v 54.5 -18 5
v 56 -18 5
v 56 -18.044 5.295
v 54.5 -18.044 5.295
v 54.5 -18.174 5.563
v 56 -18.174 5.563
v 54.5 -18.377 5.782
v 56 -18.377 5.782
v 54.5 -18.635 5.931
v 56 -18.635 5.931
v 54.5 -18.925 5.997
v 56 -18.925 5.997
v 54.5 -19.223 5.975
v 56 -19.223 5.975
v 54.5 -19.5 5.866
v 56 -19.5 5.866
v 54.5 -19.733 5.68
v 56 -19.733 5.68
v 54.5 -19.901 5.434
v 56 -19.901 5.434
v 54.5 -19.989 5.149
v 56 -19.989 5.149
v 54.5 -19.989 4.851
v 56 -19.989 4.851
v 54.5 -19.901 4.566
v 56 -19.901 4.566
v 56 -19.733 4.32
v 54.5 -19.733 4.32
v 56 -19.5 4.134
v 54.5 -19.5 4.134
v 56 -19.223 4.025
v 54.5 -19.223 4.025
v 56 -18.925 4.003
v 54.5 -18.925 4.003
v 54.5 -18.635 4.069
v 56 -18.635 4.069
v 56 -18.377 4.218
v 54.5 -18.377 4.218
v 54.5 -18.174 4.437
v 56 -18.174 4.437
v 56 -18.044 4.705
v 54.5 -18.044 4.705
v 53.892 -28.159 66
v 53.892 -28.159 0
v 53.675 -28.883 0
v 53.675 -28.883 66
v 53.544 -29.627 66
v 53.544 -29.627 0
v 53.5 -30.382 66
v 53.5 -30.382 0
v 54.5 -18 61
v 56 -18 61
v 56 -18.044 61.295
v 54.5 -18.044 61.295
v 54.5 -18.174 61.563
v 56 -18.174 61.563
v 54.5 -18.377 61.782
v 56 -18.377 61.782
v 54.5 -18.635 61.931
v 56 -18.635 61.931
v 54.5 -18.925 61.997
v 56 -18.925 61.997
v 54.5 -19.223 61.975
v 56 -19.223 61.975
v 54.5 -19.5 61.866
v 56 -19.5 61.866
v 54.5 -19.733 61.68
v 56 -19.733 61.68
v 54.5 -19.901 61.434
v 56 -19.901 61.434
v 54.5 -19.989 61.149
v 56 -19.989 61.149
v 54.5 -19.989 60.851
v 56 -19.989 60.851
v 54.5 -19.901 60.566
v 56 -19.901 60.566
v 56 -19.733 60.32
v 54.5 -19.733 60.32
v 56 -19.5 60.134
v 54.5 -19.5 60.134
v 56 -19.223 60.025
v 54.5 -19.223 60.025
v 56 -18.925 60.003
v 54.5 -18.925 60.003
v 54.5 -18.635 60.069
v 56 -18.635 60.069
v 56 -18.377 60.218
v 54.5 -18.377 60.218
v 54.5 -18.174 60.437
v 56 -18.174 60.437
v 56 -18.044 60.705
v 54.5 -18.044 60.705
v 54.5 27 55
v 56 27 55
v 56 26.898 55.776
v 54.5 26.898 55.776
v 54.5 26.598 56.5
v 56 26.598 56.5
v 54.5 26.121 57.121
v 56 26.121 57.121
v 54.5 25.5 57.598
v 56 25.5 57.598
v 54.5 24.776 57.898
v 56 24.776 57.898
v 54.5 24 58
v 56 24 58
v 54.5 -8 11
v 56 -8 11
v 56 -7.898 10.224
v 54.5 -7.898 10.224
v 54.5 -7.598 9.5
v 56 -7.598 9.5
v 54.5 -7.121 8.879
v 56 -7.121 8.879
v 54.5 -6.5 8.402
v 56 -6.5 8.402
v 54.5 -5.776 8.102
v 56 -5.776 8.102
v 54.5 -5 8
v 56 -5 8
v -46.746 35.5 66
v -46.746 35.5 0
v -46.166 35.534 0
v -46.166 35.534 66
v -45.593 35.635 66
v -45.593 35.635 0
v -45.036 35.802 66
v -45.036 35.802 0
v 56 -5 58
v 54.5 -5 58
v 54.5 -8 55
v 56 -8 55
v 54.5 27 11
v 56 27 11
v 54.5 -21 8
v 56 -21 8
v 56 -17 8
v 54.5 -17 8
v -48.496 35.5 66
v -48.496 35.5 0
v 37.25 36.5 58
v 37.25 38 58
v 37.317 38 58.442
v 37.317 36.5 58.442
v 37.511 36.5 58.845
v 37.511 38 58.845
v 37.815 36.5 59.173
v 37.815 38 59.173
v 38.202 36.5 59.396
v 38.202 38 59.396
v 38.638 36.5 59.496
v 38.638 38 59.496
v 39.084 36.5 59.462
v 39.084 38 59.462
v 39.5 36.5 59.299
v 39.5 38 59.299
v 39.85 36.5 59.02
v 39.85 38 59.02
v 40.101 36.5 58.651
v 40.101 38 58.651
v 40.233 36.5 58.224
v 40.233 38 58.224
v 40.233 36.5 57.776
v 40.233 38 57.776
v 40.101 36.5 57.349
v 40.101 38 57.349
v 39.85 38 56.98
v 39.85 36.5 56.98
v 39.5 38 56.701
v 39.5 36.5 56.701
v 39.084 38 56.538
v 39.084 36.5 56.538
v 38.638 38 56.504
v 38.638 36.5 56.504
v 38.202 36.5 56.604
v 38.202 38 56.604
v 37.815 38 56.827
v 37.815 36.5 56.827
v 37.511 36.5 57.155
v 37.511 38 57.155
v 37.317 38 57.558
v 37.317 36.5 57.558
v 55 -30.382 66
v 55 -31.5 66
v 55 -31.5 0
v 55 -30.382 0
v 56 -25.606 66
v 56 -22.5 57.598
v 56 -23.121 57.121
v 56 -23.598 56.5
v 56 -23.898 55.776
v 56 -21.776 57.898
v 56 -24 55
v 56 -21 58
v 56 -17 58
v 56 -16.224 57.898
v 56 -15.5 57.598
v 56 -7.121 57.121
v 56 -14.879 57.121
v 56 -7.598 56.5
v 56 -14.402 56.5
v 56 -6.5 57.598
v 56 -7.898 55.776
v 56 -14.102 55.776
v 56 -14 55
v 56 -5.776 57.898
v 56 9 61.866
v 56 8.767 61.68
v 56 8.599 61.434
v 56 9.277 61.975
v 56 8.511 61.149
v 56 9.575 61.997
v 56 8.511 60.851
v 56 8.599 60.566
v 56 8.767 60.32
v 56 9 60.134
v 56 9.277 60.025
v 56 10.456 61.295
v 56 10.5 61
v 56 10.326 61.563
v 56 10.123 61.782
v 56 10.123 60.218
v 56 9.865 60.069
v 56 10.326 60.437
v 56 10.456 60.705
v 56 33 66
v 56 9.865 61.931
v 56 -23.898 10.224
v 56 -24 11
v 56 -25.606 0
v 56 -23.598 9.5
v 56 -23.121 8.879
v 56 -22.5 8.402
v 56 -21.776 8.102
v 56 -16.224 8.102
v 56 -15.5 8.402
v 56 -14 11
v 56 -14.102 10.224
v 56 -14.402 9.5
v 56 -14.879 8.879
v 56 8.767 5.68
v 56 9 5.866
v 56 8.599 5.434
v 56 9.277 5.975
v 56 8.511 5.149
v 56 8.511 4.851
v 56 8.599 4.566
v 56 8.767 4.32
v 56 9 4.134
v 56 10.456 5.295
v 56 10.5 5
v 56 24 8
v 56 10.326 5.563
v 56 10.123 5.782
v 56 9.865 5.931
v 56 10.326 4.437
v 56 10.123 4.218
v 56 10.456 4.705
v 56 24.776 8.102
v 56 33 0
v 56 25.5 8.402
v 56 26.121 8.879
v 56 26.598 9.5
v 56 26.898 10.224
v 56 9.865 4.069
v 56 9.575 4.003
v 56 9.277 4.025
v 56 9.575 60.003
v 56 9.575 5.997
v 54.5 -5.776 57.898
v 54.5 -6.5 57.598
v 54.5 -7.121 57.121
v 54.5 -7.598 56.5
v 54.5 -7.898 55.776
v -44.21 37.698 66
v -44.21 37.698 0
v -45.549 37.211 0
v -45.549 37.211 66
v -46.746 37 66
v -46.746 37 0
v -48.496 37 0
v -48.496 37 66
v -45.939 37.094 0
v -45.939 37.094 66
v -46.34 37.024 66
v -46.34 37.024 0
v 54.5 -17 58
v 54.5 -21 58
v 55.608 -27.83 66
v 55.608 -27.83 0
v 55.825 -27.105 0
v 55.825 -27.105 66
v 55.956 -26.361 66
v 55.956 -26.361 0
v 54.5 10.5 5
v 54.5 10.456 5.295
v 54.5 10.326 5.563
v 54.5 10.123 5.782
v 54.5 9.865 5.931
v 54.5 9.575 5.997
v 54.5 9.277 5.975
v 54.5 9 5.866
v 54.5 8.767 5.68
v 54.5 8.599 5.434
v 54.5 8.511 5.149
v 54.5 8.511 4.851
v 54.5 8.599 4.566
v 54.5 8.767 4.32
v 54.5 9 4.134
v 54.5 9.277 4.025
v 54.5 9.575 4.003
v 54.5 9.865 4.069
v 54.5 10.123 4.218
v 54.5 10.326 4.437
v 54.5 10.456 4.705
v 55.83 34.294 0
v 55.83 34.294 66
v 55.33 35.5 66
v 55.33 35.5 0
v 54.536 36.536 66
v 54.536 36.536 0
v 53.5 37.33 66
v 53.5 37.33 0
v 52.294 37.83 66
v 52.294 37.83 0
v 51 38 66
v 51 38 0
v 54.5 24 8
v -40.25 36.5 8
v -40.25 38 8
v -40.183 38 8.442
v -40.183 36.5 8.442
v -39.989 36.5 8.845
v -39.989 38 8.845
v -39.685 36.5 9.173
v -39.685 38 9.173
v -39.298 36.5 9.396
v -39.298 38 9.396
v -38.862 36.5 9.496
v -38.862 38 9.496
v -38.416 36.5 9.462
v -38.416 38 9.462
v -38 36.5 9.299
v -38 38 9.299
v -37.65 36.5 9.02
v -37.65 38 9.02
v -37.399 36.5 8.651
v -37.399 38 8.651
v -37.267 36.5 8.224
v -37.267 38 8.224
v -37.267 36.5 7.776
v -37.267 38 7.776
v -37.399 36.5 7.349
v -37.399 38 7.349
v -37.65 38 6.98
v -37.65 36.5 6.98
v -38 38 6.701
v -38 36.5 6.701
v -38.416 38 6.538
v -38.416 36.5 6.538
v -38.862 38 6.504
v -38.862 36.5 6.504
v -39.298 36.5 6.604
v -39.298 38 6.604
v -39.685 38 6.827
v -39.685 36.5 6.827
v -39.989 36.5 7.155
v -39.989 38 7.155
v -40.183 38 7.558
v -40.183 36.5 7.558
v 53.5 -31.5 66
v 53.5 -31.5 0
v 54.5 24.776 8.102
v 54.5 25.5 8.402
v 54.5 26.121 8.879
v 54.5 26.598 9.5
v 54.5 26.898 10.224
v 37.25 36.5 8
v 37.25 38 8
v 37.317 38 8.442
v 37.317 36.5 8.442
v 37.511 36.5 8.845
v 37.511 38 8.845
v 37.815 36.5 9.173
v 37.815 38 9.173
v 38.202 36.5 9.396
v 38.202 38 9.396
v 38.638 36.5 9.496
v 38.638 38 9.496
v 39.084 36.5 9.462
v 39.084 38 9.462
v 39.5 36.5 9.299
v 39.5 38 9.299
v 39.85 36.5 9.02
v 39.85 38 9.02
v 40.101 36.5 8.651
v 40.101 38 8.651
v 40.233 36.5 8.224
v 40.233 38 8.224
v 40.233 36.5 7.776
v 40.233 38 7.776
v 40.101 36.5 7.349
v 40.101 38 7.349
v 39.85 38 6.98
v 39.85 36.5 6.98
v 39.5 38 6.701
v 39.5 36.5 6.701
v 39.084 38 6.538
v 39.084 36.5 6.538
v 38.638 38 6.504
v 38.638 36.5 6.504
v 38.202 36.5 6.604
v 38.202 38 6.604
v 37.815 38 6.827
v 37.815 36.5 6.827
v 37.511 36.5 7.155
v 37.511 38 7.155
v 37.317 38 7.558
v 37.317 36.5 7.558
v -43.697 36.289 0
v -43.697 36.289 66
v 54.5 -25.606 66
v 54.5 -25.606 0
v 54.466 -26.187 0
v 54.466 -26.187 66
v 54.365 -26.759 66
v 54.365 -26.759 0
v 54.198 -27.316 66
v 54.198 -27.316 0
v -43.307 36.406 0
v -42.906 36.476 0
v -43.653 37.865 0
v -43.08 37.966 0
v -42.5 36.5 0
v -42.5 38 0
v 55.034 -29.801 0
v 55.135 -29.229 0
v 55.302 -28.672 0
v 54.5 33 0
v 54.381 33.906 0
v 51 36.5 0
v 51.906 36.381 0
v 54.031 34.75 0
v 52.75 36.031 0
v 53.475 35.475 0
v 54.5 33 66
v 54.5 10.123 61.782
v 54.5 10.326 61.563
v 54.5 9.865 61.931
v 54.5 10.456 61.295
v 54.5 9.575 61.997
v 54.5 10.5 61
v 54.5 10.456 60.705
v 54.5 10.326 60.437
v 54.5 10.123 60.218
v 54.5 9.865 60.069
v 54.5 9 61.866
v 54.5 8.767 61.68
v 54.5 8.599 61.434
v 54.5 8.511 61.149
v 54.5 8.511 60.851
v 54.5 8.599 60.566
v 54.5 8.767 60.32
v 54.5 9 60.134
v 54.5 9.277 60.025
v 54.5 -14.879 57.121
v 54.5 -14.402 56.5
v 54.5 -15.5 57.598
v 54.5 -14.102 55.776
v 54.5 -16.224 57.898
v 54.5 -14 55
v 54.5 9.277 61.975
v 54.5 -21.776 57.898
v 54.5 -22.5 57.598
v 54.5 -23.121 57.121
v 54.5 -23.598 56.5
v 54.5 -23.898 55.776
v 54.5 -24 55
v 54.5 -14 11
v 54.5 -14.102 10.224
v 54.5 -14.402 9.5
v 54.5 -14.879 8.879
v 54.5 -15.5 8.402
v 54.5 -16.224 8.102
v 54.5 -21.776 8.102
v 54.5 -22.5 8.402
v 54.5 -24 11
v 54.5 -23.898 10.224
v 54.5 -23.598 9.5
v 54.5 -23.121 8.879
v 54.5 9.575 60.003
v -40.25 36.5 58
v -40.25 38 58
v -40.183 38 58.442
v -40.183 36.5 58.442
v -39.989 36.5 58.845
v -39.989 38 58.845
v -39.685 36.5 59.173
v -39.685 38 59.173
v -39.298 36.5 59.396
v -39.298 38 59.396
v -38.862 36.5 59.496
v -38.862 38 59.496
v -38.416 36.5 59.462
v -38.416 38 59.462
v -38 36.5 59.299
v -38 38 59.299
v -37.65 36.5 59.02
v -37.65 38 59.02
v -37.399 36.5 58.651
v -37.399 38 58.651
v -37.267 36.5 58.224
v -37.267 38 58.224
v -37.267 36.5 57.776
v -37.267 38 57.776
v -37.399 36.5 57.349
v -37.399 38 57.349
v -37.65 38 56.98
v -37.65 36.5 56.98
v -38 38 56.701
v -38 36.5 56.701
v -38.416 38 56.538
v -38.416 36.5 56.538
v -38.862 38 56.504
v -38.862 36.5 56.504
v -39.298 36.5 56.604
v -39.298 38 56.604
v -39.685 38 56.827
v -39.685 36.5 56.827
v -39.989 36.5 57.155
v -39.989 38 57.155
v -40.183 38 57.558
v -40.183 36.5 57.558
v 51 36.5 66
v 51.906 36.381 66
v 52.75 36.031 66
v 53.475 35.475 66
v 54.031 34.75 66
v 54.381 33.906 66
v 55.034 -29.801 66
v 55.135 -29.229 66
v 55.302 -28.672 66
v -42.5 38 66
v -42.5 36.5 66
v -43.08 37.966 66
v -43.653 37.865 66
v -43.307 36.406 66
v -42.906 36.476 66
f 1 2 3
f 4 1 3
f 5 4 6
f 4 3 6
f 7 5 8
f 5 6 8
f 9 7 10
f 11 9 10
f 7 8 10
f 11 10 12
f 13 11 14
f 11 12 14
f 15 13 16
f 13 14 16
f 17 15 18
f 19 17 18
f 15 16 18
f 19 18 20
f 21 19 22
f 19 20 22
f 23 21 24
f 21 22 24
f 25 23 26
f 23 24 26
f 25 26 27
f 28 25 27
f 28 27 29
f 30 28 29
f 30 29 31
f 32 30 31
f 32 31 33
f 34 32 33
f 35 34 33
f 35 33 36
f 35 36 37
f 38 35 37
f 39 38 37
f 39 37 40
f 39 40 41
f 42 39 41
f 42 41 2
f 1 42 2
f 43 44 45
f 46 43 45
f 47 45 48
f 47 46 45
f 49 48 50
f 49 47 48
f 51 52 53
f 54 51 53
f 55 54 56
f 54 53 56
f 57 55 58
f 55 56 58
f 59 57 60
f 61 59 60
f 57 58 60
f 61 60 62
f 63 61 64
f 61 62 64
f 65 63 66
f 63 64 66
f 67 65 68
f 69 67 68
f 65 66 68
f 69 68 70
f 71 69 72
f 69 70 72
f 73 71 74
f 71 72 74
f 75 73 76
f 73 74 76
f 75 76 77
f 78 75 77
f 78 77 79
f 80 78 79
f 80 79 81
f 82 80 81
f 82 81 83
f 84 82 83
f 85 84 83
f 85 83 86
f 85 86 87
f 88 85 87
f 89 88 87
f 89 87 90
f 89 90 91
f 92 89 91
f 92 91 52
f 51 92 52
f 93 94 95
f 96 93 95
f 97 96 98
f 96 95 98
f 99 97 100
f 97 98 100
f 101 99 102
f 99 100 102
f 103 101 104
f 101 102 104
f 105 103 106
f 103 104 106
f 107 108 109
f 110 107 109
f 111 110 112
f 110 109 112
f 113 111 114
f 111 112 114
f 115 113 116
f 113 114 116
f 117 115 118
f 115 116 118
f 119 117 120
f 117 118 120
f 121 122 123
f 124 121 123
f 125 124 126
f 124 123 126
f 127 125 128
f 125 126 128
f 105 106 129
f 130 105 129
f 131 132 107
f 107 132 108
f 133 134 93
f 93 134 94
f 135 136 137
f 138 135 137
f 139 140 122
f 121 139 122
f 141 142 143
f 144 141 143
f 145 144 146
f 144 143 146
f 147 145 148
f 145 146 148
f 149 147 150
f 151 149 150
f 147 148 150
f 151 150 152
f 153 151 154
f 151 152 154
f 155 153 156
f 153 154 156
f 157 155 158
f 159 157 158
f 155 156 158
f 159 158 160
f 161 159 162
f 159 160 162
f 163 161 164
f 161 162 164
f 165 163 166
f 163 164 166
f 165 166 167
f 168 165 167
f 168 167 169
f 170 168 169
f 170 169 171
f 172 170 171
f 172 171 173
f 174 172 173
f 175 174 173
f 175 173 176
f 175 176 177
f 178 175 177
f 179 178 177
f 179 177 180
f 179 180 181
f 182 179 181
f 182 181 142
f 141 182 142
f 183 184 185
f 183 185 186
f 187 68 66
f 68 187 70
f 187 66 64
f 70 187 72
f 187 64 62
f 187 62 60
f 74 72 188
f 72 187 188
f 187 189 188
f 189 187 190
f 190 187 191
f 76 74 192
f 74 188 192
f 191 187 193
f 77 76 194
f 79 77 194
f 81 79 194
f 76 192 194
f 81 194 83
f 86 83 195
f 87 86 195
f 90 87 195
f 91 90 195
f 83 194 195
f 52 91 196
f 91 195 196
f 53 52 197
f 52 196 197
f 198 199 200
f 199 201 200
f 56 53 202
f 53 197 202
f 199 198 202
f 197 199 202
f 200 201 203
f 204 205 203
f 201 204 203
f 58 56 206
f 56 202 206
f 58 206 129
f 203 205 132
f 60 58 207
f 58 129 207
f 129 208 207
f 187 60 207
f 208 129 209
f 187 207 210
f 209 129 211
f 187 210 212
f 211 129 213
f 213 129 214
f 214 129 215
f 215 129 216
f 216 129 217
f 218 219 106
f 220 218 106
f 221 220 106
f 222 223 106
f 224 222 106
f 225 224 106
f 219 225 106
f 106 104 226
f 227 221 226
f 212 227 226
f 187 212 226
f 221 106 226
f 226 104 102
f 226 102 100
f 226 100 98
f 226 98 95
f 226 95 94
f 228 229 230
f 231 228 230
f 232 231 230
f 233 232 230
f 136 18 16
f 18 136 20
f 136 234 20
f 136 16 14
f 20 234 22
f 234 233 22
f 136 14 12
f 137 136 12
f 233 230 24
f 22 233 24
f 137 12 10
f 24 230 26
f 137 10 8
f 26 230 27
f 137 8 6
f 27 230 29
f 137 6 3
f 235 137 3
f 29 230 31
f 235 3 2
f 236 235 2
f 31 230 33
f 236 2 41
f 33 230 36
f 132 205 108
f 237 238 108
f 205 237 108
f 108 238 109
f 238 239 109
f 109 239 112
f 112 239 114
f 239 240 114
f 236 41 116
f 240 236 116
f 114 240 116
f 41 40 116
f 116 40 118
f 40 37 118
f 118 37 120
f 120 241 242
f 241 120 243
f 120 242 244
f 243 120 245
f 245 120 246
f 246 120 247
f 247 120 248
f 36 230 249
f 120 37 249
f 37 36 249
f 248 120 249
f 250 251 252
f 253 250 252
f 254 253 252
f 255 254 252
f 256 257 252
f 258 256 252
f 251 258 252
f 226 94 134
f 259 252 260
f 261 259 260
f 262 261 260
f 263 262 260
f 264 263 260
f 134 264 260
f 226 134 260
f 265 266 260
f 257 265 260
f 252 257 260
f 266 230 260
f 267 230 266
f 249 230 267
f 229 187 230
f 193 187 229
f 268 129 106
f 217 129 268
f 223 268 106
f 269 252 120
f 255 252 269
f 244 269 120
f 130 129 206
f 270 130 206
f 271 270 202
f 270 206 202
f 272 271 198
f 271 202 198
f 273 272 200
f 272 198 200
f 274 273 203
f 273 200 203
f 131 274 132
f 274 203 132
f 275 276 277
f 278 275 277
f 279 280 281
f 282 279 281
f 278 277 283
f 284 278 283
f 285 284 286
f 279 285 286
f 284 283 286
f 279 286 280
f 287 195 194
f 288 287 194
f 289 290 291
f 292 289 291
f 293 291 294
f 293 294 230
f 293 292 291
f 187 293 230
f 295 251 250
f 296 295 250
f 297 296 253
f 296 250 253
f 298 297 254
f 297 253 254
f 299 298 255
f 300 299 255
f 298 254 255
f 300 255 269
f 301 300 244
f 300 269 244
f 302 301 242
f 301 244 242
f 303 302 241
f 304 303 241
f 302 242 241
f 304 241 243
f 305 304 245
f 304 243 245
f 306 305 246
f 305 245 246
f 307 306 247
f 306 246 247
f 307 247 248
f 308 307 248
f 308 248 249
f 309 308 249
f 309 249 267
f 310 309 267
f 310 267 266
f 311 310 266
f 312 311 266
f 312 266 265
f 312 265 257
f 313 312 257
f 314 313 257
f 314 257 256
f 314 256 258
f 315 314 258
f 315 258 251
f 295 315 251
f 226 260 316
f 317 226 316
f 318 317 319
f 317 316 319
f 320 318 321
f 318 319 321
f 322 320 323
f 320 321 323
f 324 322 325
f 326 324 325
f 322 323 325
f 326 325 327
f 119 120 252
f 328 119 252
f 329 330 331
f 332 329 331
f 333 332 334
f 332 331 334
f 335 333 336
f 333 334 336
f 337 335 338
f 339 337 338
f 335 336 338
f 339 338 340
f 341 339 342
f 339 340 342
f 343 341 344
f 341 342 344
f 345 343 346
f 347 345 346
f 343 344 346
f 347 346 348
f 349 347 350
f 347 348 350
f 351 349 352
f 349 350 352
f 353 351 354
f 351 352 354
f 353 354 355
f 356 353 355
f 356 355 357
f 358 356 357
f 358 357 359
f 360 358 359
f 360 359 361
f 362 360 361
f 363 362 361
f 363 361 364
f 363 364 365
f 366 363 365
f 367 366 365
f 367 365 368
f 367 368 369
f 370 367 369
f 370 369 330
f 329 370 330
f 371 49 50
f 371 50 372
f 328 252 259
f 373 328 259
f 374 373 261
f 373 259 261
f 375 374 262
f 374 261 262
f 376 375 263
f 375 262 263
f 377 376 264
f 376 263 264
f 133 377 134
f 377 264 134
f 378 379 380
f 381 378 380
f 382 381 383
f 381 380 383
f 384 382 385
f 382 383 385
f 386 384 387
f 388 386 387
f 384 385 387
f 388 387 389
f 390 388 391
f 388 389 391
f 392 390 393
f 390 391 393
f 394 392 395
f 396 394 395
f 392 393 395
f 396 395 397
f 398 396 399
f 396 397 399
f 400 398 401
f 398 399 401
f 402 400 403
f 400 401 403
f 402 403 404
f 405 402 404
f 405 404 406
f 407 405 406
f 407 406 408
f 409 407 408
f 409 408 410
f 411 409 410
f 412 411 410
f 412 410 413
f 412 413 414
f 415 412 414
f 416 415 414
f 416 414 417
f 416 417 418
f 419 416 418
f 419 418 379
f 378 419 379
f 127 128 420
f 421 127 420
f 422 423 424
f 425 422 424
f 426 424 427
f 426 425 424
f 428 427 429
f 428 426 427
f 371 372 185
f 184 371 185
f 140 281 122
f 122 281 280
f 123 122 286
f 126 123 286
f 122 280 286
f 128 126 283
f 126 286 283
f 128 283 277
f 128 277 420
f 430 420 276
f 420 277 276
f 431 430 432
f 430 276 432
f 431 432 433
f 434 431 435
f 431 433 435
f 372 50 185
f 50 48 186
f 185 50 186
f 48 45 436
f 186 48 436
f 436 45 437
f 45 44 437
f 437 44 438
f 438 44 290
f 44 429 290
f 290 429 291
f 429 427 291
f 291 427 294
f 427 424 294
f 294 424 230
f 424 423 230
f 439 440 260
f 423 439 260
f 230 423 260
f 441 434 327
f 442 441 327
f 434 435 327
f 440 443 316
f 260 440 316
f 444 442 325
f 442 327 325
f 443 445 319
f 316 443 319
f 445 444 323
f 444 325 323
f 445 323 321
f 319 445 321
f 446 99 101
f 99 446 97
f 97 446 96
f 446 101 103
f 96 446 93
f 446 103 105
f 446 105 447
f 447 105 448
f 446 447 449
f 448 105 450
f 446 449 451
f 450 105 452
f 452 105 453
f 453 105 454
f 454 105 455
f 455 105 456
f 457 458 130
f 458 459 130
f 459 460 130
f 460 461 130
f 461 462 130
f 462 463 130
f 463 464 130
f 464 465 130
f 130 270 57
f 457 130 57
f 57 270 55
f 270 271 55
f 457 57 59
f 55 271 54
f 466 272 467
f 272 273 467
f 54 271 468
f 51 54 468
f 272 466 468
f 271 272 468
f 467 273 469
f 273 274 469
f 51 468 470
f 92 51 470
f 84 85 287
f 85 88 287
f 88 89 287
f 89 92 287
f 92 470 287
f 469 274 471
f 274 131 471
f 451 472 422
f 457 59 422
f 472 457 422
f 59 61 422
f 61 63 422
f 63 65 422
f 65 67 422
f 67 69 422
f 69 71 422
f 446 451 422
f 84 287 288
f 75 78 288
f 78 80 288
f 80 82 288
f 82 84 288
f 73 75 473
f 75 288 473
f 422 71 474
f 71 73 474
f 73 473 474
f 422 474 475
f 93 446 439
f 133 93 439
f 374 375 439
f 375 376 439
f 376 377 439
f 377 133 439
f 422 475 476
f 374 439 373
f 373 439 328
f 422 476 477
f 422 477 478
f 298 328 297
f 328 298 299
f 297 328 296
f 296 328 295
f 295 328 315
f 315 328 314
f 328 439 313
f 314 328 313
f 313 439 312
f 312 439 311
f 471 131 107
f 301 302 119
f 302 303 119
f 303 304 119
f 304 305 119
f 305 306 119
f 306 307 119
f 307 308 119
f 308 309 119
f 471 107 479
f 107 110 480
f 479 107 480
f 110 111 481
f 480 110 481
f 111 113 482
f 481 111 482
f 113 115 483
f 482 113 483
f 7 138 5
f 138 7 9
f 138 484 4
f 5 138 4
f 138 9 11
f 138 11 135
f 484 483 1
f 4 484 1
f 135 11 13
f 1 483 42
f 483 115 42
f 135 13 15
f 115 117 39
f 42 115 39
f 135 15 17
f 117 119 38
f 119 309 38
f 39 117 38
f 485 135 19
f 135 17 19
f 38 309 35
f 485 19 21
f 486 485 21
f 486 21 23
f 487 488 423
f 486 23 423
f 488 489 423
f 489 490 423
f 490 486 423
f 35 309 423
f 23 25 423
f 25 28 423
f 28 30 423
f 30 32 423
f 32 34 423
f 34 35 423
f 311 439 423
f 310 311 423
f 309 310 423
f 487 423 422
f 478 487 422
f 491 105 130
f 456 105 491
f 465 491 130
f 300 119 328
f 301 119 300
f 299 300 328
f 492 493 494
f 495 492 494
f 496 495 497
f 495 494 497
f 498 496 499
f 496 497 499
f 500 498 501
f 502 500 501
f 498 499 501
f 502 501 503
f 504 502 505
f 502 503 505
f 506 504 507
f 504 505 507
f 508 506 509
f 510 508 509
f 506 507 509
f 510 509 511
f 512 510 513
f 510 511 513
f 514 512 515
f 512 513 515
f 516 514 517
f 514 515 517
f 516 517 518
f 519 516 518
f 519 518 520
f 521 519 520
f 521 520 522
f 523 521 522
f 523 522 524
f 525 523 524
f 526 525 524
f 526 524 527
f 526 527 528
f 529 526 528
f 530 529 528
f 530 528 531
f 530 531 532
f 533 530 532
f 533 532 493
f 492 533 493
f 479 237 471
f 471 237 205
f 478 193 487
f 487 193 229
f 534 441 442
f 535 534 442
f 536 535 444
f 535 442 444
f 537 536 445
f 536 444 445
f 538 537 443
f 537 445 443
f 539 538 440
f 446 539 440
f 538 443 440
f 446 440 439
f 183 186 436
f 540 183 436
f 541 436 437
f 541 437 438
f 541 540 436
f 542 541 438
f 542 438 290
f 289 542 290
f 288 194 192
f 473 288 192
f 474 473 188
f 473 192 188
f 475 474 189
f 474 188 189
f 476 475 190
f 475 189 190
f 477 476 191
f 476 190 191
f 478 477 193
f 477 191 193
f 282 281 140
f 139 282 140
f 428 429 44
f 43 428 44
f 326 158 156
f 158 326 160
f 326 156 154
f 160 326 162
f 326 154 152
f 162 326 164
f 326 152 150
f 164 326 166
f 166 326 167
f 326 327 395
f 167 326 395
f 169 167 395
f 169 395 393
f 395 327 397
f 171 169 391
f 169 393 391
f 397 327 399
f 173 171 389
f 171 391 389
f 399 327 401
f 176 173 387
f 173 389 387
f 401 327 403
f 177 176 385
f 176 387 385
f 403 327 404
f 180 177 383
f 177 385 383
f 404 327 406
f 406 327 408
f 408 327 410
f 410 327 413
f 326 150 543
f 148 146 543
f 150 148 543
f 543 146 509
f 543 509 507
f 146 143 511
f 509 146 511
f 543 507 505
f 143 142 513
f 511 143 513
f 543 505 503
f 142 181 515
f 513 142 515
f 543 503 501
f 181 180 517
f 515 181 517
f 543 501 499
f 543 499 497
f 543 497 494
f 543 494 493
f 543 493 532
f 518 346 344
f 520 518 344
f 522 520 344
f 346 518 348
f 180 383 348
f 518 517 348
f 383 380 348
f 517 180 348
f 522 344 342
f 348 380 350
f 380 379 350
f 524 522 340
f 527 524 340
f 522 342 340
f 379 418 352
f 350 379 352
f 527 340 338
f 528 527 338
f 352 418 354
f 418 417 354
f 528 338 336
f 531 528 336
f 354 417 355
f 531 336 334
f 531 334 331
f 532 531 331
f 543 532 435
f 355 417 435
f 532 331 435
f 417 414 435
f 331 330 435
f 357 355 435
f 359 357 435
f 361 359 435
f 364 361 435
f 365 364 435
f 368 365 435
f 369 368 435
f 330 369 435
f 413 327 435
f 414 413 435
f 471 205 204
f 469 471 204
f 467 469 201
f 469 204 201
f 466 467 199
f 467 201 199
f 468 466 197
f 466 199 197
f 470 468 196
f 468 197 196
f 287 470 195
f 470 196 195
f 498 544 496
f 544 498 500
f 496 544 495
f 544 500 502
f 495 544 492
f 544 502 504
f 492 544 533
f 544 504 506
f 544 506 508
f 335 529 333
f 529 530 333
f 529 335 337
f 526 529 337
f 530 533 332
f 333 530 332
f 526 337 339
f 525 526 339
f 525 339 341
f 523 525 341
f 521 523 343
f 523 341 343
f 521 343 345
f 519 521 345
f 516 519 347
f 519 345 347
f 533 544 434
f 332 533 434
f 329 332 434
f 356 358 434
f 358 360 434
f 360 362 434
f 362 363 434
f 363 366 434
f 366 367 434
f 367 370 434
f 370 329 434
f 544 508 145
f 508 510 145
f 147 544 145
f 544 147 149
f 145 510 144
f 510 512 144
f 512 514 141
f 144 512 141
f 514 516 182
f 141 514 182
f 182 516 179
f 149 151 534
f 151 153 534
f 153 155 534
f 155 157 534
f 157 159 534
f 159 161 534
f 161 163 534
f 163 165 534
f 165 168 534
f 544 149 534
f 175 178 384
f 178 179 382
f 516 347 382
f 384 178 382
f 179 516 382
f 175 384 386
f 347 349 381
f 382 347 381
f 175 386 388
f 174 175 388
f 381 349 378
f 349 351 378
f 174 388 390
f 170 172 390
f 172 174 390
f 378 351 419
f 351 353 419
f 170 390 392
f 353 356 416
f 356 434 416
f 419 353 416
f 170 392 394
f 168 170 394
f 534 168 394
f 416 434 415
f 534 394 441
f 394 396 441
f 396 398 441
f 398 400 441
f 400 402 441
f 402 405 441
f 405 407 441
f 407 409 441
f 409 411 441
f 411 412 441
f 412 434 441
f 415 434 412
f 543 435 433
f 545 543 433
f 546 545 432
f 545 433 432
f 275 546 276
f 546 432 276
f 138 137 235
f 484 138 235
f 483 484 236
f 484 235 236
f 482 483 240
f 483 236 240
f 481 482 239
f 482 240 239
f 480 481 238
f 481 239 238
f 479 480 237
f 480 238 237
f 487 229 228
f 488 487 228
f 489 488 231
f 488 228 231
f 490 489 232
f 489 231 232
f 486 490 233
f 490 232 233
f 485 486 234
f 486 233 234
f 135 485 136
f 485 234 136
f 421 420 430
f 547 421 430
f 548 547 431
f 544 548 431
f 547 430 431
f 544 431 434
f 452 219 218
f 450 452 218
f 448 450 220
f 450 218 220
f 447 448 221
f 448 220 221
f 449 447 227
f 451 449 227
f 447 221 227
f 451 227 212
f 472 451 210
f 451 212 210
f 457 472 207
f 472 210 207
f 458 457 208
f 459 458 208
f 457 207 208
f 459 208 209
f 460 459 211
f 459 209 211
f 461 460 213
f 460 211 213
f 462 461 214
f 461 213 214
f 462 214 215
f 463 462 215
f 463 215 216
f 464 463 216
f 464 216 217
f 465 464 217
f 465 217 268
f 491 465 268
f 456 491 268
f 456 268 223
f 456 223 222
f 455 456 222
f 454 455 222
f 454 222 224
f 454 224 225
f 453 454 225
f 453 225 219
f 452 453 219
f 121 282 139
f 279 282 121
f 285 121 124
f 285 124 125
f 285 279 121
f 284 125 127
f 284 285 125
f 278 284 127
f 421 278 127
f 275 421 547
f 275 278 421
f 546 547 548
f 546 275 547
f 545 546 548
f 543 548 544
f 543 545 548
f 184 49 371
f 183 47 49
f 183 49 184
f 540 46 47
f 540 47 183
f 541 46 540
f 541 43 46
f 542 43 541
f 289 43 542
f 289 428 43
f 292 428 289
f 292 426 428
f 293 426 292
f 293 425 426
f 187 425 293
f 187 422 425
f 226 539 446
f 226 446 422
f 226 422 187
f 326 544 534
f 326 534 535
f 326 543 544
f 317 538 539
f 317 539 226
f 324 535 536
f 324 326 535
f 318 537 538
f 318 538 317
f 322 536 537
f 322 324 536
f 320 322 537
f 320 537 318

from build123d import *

# Parameters (mm, degrees)
F1_DEPTH  = 66
F2_R      = 1.5
F3_DEPTH  = 25
F4_R      = 1
F5_DEPTH  = 25
F6_R      = 5
F7_R      = 6.5
F8_W      = 7
F8_H      = 48
F9_DEPTH  = 100
F11_DEPTH = 66


with BuildPart() as f1:
    # F0 (on Top) → F1 (new body)
    with BuildSketch(Plane.XY):
        with BuildLine():
            Line((54.5, 33), (54.5, -26.488032))
            Line((54.5, -26.488032), (53.5, -29.23551))
            Line((53.5, -29.23551), (53.5, -31.5))
            Line((53.5, -31.5), (55, -31.5))
            Line((55, -31.5), (55, -29.5))
            Line((55, -29.5), (56, -26.752523))
            Line((56, -26.752523), (56, 33))
            ThreePointArc((56, 33), (54.535534, 36.535534), (51, 38))
            Line((51, 38), (-42.5, 38))
            ThreePointArc((-42.5, 38), (-46.035534, 36.535534), (-47.5, 33))
            Line((-47.5, 33), (-47.5, 0))
            Line((-47.5, 0), (-46, 0))
            Line((-46, 0), (-46, 33))
            ThreePointArc((-46, 33), (-44.974874, 35.474874), (-42.5, 36.5))
            Line((-42.5, 36.5), (51, 36.5))
            ThreePointArc((51, 36.5), (53.474874, 35.474874), (54.5, 33))
        make_face()
    extrude(amount=F1_DEPTH)

    # F2 (on face) → F3 (cut)
    with BuildSketch(Plane(origin=(0, 38, 0), x_dir=(-1, 0, 0), z_dir=(0, 1, 0))):
        with Locations((-38.75, 58)):
            Circle(F2_R)
        with Locations((-38.75, 8)):
            Circle(F2_R)
        with Locations((38.75, 8)):
            Circle(F2_R)
        with Locations((38.75, 58)):
            Circle(F2_R)
    extrude(amount=-F3_DEPTH, mode=Mode.SUBTRACT)

    # F4 (on face) → F5 (cut)
    with BuildSketch(Plane.YZ.offset(56)):
        with BuildLine():
            Line((-17, 58), (-21, 58))
            ThreePointArc((-21, 58), (-23.12132, 57.12132), (-24, 55))
            Line((-24, 55), (-24, 11))
            ThreePointArc((-24, 11), (-23.12132, 8.87868), (-21, 8))
            Line((-21, 8), (-17, 8))
            ThreePointArc((-17, 8), (-14.87868, 8.87868), (-14, 11))
            Line((-14, 11), (-14, 55))
            ThreePointArc((-14, 55), (-14.87868, 57.12132), (-17, 58))
        make_face()
        with BuildLine():
            Line((24, 58), (-5, 58))
            ThreePointArc((-5, 58), (-7.12132, 57.12132), (-8, 55))
            Line((-8, 55), (-8, 11))
            ThreePointArc((-8, 11), (-7.12132, 8.87868), (-5, 8))
            Line((-5, 8), (24, 8))
            ThreePointArc((24, 8), (26.12132, 8.87868), (27, 11))
            Line((27, 11), (27, 55))
            ThreePointArc((27, 55), (26.12132, 57.12132), (24, 58))
        make_face()
        with Locations((-19, 61)):
            Circle(F4_R)
        with Locations((9.5, 61)):
            Circle(F4_R)
        with Locations((9.5, 5)):
            Circle(F4_R)
        with Locations((-19, 5)):
            Circle(F4_R)
    extrude(amount=-F5_DEPTH, mode=Mode.SUBTRACT)

    # F6
    f6_edges = [f1.edges().sort_by_distance(p)[0] for p in [
        (55, -29.5, 33),
        (54.5, -26.488032, 33),
    ]]
    fillet(f6_edges, radius=F6_R)

    # F7
    f7_edges = [f1.edges().sort_by_distance(p)[0] for p in [
        (56, -26.752523, 33),
        (53.5, -29.23551, 33),
    ]]
    fillet(f7_edges, radius=F7_R)

    # F8 (on Top) → F9 (cut)
    with BuildSketch(Plane.XY):
        with Locations((-46, 19)):
            Rectangle(F8_W, F8_H)
    extrude(amount=F9_DEPTH, mode=Mode.SUBTRACT)

    # F10 (on Top) → F11 (join)
    with BuildSketch(Plane.XY):
        with BuildLine():
            Line((-48.496257, 37), (-48.496257, 35.5))
            Line((-48.496257, 35.5), (-46.746257, 35.5))
            ThreePointArc((-46.746257, 35.5), (-45.878016, 35.575961), (-45.036156, 35.801537))
            Line((-45.036156, 35.801537), (-43.697071, 36.288924))
            ThreePointArc((-43.697071, 36.288924), (-43.107769, 36.446827), (-42.5, 36.5))
            Line((-42.5, 36.5), (-42.5, 38))
            ThreePointArc((-42.5, 38), (-43.368241, 37.924039), (-44.210101, 37.698463))
            Line((-44.210101, 37.698463), (-45.549186, 37.211076))
            ThreePointArc((-45.549186, 37.211076), (-46.138488, 37.053173), (-46.746257, 37))
            Line((-46.746257, 37), (-48.496257, 37))
        make_face()
    extrude(amount=F11_DEPTH)


solid = f1.part
